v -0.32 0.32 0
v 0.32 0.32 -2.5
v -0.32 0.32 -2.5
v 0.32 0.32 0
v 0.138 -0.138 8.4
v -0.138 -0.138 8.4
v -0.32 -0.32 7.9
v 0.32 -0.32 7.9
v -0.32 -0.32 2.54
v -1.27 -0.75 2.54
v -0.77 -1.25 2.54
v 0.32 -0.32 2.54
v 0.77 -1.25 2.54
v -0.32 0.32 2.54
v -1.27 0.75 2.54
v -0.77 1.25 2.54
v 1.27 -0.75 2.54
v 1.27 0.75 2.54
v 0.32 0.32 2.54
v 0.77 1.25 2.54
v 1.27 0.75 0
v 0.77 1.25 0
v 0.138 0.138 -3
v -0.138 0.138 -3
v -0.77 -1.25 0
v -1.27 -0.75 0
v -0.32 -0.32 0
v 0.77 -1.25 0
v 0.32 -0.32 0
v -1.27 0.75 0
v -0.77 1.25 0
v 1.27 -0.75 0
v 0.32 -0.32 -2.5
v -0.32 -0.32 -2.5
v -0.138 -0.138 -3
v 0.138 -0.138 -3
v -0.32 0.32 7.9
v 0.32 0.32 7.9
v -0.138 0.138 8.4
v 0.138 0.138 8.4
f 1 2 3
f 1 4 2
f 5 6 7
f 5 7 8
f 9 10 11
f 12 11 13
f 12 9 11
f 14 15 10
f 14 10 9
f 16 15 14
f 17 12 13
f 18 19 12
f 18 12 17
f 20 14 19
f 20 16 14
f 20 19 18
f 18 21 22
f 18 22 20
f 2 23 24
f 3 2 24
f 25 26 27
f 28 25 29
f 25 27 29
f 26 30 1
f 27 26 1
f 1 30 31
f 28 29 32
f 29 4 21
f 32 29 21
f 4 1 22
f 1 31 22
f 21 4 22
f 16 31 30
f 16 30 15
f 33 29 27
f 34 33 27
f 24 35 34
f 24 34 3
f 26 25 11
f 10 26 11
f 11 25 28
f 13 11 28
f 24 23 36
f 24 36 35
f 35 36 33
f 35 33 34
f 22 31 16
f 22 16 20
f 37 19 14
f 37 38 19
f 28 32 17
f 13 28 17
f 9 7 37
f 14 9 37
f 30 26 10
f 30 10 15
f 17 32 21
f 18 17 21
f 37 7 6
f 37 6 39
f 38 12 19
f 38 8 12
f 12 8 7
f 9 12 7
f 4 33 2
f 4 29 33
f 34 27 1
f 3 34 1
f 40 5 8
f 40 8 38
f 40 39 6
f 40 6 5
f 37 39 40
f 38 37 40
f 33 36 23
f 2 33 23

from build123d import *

# Parameters (mm, degrees)
SKETCH1_W             = 0.64
SKETCH1_H             = 0.64
BOSS_EXTRUDE1_DEPTH   = 8.4
SKETCH2_W             = 0.64
SKETCH2_H             = 0.64
BOSS_EXTRUDE2_DEPTH   = 3
CHAMFER1_SIZE         = 0.5
CHAMFER1_SIZE2        = 0.181985117
CHAMFER1_PART_2_SIZE  = 0.5
CHAMFER1_PART_2_SIZE2 = 0.181985117
CHAMFER1_PART_3_SIZE  = 0.5
CHAMFER1_PART_3_SIZE2 = 0.181985117
CHAMFER1_PART_4_SIZE  = 0.5
CHAMFER1_PART_4_SIZE2 = 0.181985117
SKETCH3_W             = 2.54
SKETCH3_H             = 2.5
BOSS_EXTRUDE3_DEPTH   = 2.54
CHAMFER2_SIZE         = 0.5


with BuildPart() as part:
    # Sketch1 → Boss-Extrude1 (new body)
    with BuildSketch(Plane.XY):
        Rectangle(SKETCH1_W, SKETCH1_H)
    extrude(amount=BOSS_EXTRUDE1_DEPTH)

    # Sketch2 → Boss-Extrude2 (add)
    with BuildSketch(Plane(origin=(0, 0, 0), x_dir=(-1, 0, 0), z_dir=(0, 0, -1))):
        Rectangle(SKETCH2_W, SKETCH2_H)
    extrude(amount=BOSS_EXTRUDE2_DEPTH)

    # Chamfer1
    chamfer1_edges = [part.edges().sort_by_distance(p)[0] for p in [
        (0.32, 0, 8.4),
        (0.32, 0, -3),
    ]]
    chamfer1_side = [part.faces().sort_by_distance(p)[0] for p in [
        (0.32, 0, 2.7),
    ]]
    chamfer(chamfer1_edges, length=CHAMFER1_SIZE, length2=CHAMFER1_SIZE2, reference=chamfer1_side[0])

    # Chamfer1 part 2
    chamfer1_part_2_edges = [part.edges().sort_by_distance(p)[0] for p in [
        (0, 0.32, 8.4),
        (0, 0.32, -3),
    ]]
    chamfer1_part_2_side = [part.faces().sort_by_distance(p)[0] for p in [
        (0, 0.32, 2.7),
    ]]
    chamfer(chamfer1_part_2_edges, length=CHAMFER1_PART_2_SIZE, length2=CHAMFER1_PART_2_SIZE2, reference=chamfer1_part_2_side[0])

    # Chamfer1 part 3
    chamfer1_part_3_edges = [part.edges().sort_by_distance(p)[0] for p in [
        (-0.32, 0, -3),
        (-0.32, 0, 8.4),
    ]]
    chamfer1_part_3_side = [part.faces().sort_by_distance(p)[0] for p in [
        (-0.32, 0, 2.7),
    ]]
    chamfer(chamfer1_part_3_edges, length=CHAMFER1_PART_3_SIZE, length2=CHAMFER1_PART_3_SIZE2, reference=chamfer1_part_3_side[0])

    # Chamfer1 part 4
    chamfer1_part_4_edges = [part.edges().sort_by_distance(p)[0] for p in [
        (0, -0.32, -3),
        (0, -0.32, 8.4),
    ]]
    chamfer1_part_4_side = [part.faces().sort_by_distance(p)[0] for p in [
        (0, -0.32, 2.7),
    ]]
    chamfer(chamfer1_part_4_edges, length=CHAMFER1_PART_4_SIZE, length2=CHAMFER1_PART_4_SIZE2, reference=chamfer1_part_4_side[0])

    # Sketch3 → Boss-Extrude3 (add)
    with BuildSketch(Plane.XY):
        Rectangle(SKETCH3_W, SKETCH3_H)
    extrude(amount=BOSS_EXTRUDE3_DEPTH)

    # Chamfer2
    chamfer2_edges = [part.edges().sort_by_distance(p)[0] for p in [
        (-1.27, 1.25, 1.27),
        (-1.27, -1.25, 1.27),
        (1.27, -1.25, 1.27),
        (1.27, 1.25, 1.27),
    ]]
    chamfer(chamfer2_edges, length=CHAMFER2_SIZE)


solid = part.part
